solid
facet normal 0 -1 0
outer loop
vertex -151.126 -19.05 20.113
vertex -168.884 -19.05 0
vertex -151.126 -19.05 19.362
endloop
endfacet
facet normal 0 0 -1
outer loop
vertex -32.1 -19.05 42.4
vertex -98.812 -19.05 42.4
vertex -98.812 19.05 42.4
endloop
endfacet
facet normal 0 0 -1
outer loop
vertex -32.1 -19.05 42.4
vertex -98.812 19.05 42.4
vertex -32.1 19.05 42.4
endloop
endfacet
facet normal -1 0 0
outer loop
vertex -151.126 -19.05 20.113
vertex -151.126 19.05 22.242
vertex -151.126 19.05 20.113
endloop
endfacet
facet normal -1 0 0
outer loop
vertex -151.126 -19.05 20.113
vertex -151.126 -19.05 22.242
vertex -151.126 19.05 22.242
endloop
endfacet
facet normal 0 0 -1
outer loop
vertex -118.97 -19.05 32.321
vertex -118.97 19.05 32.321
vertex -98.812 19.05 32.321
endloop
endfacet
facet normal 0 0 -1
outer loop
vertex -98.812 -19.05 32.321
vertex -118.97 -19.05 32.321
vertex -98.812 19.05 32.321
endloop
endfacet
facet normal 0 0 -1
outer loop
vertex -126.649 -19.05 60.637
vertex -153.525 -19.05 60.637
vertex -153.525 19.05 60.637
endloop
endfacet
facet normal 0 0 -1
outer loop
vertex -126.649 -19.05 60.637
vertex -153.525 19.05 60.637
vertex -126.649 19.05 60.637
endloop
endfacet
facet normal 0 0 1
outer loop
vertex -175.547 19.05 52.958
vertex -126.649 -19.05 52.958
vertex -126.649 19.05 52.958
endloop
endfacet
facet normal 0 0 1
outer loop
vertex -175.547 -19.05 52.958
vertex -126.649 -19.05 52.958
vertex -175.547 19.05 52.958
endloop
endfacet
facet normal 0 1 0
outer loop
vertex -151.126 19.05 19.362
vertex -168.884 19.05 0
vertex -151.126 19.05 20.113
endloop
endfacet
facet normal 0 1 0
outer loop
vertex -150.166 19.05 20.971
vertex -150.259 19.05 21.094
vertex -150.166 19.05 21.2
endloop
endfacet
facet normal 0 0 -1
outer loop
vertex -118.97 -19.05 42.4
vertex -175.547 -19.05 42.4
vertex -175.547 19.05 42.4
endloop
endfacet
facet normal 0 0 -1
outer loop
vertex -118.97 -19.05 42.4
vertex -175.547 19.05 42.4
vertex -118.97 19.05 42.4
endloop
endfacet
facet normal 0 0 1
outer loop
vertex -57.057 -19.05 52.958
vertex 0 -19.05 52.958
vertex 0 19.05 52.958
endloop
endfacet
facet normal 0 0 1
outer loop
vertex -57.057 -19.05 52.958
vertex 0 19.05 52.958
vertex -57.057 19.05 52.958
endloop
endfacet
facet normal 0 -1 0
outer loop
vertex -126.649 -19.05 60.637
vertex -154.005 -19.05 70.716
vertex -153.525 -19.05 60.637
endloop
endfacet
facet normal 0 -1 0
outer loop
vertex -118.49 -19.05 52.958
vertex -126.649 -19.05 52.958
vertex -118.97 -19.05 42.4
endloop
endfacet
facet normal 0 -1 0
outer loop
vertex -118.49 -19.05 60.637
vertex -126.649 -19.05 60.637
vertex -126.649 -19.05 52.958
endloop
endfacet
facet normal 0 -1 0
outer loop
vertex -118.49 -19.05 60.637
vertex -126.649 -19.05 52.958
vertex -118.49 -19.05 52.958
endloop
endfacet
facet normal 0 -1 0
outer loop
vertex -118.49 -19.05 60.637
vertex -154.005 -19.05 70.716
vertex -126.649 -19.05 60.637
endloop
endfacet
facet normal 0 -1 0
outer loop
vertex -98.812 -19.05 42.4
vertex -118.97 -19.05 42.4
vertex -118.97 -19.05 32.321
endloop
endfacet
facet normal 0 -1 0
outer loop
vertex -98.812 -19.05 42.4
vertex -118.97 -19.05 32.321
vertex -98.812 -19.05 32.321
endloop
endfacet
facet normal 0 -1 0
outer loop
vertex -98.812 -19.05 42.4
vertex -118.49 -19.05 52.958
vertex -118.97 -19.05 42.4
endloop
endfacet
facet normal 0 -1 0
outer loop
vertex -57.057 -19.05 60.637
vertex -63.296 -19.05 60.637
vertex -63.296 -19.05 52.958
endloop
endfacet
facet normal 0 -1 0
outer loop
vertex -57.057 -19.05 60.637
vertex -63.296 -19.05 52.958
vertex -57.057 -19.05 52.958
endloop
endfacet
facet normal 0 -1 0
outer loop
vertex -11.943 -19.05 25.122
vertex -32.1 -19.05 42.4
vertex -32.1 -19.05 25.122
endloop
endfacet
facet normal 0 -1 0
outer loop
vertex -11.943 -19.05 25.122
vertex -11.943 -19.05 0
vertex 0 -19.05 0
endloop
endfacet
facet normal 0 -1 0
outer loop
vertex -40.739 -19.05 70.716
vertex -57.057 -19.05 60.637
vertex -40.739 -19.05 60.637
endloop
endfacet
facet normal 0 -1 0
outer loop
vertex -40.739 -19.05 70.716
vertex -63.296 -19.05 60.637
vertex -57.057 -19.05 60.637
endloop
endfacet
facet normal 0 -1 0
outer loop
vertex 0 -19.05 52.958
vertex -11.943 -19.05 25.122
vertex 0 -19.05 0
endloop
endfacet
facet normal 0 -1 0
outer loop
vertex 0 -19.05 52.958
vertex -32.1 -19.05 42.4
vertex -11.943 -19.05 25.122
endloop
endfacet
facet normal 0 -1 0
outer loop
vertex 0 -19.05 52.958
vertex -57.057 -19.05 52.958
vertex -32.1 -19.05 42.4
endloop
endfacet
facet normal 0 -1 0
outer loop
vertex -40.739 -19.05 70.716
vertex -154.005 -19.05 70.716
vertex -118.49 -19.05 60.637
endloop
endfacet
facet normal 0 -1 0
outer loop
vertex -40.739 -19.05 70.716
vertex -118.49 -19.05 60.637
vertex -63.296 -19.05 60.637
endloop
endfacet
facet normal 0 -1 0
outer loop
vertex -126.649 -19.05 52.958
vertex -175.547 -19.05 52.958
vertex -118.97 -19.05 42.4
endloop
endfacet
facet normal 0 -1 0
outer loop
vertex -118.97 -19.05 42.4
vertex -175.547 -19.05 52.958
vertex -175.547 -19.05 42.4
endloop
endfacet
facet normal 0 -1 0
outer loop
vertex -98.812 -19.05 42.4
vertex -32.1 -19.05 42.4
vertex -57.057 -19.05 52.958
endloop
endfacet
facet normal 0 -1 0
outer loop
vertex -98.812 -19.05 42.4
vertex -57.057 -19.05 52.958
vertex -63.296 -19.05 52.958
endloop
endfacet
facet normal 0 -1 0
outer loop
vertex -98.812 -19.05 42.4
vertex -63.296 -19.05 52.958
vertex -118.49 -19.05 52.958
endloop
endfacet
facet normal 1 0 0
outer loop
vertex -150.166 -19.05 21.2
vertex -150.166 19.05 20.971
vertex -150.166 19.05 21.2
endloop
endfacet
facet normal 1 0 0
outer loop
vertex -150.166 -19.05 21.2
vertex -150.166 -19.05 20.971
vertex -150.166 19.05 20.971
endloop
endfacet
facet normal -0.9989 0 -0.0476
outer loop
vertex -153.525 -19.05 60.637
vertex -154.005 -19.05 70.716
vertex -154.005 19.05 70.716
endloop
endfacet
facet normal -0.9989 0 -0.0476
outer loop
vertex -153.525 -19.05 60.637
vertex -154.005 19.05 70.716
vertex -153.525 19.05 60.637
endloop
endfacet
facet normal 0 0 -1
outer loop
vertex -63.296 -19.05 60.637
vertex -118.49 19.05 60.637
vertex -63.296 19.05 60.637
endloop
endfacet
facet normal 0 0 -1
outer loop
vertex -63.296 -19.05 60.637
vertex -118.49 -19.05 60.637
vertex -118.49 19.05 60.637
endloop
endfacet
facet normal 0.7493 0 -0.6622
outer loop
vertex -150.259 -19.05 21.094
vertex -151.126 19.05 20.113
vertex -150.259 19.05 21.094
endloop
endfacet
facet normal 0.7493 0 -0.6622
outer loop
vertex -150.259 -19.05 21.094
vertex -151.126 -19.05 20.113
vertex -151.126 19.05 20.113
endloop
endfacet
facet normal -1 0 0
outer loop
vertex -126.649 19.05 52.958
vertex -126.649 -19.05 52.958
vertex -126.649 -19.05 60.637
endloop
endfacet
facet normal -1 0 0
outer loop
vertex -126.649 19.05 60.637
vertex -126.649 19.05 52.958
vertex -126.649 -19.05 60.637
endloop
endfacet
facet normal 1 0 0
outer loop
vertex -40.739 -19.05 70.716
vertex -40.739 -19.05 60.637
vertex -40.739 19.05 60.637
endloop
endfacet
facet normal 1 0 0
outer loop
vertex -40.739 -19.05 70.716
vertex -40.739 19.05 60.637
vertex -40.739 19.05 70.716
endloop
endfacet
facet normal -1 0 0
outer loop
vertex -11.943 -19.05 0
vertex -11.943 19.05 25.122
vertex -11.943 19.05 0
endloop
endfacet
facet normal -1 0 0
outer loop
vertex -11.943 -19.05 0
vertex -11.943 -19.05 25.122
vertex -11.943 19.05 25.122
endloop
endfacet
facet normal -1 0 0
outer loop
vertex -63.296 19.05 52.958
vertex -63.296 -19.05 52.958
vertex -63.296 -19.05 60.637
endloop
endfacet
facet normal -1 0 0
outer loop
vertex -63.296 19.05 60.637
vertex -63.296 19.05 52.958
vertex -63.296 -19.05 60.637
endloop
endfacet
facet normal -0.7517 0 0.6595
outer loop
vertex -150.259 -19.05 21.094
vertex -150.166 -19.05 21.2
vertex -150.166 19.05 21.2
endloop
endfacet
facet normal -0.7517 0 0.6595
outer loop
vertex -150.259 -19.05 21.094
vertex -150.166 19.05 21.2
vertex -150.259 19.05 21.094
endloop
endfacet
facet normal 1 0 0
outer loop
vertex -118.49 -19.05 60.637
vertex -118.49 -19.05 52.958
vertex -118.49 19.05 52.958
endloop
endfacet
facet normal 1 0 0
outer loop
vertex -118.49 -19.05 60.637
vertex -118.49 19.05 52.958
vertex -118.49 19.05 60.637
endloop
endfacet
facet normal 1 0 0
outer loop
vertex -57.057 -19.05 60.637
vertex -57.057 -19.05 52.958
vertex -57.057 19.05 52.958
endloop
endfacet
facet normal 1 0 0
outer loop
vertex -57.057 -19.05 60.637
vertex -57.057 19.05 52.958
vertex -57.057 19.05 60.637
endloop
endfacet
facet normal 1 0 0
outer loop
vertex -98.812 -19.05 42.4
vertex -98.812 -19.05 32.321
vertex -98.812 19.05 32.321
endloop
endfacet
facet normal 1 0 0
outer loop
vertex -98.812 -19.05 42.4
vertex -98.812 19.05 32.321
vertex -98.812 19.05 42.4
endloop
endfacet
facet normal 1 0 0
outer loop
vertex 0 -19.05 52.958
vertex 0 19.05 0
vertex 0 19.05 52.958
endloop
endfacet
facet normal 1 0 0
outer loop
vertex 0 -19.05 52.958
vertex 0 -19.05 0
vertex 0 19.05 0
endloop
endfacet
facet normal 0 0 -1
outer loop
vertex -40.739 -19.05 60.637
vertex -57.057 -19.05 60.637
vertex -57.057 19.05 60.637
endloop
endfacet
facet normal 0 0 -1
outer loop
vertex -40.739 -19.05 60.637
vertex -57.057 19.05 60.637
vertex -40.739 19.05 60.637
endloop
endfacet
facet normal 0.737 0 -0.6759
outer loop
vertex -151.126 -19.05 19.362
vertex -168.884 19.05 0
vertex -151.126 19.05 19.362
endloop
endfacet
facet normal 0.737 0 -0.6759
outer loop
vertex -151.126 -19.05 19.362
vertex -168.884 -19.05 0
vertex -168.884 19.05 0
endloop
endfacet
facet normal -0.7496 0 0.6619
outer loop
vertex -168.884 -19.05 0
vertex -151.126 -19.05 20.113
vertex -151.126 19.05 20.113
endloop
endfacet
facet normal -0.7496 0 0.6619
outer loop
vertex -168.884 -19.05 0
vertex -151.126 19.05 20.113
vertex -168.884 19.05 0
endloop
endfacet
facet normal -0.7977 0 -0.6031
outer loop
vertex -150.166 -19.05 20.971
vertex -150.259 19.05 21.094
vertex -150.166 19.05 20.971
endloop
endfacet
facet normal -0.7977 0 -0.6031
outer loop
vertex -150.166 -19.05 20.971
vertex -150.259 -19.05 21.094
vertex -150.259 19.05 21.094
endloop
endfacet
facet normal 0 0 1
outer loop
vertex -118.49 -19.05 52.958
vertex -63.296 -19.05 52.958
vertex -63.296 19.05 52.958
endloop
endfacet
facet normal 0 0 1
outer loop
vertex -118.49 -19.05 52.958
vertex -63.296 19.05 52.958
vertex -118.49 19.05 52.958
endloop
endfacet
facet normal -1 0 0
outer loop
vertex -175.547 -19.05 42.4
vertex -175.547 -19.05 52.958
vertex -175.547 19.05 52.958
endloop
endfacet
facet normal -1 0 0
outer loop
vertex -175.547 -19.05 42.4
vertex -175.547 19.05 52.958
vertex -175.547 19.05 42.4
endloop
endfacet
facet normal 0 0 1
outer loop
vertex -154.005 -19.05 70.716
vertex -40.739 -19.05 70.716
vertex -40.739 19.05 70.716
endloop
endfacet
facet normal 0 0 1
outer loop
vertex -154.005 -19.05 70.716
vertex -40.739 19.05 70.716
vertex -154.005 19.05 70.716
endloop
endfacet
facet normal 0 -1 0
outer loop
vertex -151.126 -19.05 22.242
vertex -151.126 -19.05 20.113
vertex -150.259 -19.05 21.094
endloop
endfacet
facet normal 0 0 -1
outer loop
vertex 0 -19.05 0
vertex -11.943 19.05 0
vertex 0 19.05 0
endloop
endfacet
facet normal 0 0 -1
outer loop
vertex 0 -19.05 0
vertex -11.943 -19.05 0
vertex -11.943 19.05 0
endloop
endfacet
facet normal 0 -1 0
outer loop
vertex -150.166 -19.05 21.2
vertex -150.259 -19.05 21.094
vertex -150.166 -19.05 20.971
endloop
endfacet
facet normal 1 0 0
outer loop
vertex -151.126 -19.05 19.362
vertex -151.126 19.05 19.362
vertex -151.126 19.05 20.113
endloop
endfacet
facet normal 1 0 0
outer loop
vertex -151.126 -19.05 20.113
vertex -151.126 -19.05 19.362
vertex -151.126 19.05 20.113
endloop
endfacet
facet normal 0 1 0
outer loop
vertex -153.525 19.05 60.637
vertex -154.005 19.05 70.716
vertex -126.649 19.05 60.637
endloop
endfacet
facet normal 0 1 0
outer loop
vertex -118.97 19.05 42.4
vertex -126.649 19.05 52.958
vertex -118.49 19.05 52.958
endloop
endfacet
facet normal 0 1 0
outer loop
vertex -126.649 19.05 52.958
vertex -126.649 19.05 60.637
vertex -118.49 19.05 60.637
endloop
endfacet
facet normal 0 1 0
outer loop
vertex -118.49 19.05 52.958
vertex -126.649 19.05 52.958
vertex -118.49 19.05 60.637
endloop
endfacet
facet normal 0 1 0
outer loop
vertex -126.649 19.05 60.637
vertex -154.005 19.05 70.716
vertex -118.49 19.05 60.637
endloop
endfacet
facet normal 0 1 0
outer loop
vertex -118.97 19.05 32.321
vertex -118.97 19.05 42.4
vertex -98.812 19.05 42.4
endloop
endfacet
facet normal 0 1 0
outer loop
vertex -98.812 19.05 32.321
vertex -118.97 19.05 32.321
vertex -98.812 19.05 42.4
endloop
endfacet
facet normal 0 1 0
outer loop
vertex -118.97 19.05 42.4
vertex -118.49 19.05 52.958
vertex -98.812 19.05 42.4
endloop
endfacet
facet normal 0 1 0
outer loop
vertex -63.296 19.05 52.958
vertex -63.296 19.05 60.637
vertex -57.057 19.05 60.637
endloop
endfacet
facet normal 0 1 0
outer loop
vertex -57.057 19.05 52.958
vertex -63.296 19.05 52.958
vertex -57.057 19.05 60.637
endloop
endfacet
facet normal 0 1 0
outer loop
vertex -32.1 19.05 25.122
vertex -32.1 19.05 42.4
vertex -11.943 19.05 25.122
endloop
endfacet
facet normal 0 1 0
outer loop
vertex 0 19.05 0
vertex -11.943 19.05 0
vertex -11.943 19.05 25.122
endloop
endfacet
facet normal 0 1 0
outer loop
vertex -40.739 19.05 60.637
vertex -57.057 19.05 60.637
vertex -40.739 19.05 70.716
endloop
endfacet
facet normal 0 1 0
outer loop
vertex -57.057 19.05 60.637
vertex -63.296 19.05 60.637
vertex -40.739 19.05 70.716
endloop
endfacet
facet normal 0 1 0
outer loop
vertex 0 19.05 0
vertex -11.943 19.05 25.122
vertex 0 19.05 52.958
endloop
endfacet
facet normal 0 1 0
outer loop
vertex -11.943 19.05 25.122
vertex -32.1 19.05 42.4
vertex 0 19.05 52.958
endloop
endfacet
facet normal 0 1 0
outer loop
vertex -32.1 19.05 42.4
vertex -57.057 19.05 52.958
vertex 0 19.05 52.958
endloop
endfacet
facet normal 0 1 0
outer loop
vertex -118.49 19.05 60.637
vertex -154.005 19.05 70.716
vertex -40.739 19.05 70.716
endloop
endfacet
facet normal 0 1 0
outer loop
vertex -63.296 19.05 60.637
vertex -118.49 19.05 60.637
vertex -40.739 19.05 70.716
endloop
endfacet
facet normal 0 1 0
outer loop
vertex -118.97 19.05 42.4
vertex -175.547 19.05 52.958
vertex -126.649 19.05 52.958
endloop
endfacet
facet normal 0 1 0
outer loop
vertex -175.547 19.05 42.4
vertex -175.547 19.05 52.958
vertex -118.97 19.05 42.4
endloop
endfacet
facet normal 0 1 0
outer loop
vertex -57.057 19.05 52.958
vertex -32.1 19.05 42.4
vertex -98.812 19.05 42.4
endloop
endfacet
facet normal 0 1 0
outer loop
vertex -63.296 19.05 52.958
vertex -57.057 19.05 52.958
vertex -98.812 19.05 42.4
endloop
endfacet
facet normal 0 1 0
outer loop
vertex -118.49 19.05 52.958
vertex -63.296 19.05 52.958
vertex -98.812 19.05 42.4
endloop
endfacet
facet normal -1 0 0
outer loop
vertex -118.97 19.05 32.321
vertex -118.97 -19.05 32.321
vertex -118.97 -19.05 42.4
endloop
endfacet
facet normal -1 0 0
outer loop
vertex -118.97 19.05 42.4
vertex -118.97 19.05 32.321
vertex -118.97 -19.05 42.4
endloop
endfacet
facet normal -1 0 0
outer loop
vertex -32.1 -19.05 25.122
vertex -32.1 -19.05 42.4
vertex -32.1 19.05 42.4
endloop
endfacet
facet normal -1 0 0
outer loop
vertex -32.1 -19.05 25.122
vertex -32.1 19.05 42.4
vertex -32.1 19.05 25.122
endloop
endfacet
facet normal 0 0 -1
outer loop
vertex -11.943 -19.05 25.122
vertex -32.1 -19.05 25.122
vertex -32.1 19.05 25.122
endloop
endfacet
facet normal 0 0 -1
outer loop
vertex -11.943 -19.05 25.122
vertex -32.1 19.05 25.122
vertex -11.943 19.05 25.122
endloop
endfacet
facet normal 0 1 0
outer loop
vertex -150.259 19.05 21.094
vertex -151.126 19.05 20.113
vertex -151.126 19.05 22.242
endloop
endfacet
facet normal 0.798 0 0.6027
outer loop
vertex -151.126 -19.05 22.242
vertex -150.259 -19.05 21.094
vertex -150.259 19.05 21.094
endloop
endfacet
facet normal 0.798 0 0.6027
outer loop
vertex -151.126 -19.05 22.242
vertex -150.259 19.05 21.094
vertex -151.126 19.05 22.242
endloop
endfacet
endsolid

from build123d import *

# Parameters (mm, degrees)
F0_W     = 6.2392428517
F0_H     = 7.6790601015
F0_W_2   = 20.1575532556
F0_H_2   = 10.0787729025
F0_W_3   = 8.159019053
F1_DEPTH = 19.05


with BuildPart() as f1:
    # F0 (on Front) → F1 (new body, symmetric)
    with BuildSketch(Plane.XZ):
        Polygon((0, 0), (0, 42.3995219171), (-11.9426297024, 42.3995219171), (-11.9426297024, 25.1216199249), (-11.9426297024, 0), align=None)
        Polygon((-11.9426297024, 42.3995219171), (0, 42.3995219171), (0, 52.9582537711), (-57.0571571589, 52.9582537711), (-63.2964000106, 52.9582537711), (-118.4897050261, 52.9582537711), (-126.6487240791, 52.9582537711), (-175.5468696356, 52.9582537711), (-175.5468696356, 42.3995219171), (-150.1658707857, 42.3995219171), (-118.9696490765, 42.3995219171), (-98.8120958209, 42.3995219171), (-32.1001857519, 42.3995219171), (-17.2219891101, 42.3995219171), align=None)
        Polygon((-11.9426297024, 25.1216199249), (-11.9426297024, 42.3995219171), (-17.2219891101, 42.3995219171), (-32.1001857519, 42.3995219171), (-32.1001857519, 25.1216199249), align=None)
        with Locations((-60.1767785847, 56.7977838218)):
            Rectangle(F0_W, F0_H)
        Polygon((-63.2964000106, 60.6373138726), (-57.0571571589, 60.6373138726), (-40.7391376793, 60.6373138726), (-40.7391376793, 70.7160905004), (-154.0053933859, 70.7160905004), (-153.5254716873, 60.6373138726), (-126.6487240791, 60.6373138726), (-118.4897050261, 60.6373138726), align=None)
        with Locations((-108.8908724487, 37.3601354659)):
            Rectangle(F0_W_2, F0_H_2)
        with Locations((-122.5692145526, 56.7977838218)):
            Rectangle(F0_W_3, F0_H)
    extrude(amount=F1_DEPTH, both=True)


with BuildPart() as f1b:
    # F0 (on Front) → F1, piece 2 (new body, symmetric)
    with BuildSketch(Plane.XZ):
        Polygon((-151.1257588863, 19.3623192608), (-151.1257588863, 20.1125881042), (-168.8835918903, 0), align=None)
    extrude(amount=F1_DEPTH, both=True)


with BuildPart() as f1c:
    # F0 (on Front) → F1, piece 3 (new body, symmetric)
    with BuildSketch(Plane.XZ):
        Polygon((-151.1257588863, 20.1125881042), (-150.2589904928, 21.0942932298), (-151.1257588863, 22.2419705242), align=None)
    extrude(amount=F1_DEPTH, both=True)


with BuildPart() as f1d:
    # F0 (on Front) → F1, piece 4 (new body, symmetric)
    with BuildSketch(Plane.XZ):
        Polygon((-150.1658707857, 20.970994579), (-150.1658707857, 21.1997609586), (-150.2589904928, 21.0942932298), align=None)
    extrude(amount=F1_DEPTH, both=True)


solid = Compound([f1.part, f1b.part, f1c.part, f1d.part])
